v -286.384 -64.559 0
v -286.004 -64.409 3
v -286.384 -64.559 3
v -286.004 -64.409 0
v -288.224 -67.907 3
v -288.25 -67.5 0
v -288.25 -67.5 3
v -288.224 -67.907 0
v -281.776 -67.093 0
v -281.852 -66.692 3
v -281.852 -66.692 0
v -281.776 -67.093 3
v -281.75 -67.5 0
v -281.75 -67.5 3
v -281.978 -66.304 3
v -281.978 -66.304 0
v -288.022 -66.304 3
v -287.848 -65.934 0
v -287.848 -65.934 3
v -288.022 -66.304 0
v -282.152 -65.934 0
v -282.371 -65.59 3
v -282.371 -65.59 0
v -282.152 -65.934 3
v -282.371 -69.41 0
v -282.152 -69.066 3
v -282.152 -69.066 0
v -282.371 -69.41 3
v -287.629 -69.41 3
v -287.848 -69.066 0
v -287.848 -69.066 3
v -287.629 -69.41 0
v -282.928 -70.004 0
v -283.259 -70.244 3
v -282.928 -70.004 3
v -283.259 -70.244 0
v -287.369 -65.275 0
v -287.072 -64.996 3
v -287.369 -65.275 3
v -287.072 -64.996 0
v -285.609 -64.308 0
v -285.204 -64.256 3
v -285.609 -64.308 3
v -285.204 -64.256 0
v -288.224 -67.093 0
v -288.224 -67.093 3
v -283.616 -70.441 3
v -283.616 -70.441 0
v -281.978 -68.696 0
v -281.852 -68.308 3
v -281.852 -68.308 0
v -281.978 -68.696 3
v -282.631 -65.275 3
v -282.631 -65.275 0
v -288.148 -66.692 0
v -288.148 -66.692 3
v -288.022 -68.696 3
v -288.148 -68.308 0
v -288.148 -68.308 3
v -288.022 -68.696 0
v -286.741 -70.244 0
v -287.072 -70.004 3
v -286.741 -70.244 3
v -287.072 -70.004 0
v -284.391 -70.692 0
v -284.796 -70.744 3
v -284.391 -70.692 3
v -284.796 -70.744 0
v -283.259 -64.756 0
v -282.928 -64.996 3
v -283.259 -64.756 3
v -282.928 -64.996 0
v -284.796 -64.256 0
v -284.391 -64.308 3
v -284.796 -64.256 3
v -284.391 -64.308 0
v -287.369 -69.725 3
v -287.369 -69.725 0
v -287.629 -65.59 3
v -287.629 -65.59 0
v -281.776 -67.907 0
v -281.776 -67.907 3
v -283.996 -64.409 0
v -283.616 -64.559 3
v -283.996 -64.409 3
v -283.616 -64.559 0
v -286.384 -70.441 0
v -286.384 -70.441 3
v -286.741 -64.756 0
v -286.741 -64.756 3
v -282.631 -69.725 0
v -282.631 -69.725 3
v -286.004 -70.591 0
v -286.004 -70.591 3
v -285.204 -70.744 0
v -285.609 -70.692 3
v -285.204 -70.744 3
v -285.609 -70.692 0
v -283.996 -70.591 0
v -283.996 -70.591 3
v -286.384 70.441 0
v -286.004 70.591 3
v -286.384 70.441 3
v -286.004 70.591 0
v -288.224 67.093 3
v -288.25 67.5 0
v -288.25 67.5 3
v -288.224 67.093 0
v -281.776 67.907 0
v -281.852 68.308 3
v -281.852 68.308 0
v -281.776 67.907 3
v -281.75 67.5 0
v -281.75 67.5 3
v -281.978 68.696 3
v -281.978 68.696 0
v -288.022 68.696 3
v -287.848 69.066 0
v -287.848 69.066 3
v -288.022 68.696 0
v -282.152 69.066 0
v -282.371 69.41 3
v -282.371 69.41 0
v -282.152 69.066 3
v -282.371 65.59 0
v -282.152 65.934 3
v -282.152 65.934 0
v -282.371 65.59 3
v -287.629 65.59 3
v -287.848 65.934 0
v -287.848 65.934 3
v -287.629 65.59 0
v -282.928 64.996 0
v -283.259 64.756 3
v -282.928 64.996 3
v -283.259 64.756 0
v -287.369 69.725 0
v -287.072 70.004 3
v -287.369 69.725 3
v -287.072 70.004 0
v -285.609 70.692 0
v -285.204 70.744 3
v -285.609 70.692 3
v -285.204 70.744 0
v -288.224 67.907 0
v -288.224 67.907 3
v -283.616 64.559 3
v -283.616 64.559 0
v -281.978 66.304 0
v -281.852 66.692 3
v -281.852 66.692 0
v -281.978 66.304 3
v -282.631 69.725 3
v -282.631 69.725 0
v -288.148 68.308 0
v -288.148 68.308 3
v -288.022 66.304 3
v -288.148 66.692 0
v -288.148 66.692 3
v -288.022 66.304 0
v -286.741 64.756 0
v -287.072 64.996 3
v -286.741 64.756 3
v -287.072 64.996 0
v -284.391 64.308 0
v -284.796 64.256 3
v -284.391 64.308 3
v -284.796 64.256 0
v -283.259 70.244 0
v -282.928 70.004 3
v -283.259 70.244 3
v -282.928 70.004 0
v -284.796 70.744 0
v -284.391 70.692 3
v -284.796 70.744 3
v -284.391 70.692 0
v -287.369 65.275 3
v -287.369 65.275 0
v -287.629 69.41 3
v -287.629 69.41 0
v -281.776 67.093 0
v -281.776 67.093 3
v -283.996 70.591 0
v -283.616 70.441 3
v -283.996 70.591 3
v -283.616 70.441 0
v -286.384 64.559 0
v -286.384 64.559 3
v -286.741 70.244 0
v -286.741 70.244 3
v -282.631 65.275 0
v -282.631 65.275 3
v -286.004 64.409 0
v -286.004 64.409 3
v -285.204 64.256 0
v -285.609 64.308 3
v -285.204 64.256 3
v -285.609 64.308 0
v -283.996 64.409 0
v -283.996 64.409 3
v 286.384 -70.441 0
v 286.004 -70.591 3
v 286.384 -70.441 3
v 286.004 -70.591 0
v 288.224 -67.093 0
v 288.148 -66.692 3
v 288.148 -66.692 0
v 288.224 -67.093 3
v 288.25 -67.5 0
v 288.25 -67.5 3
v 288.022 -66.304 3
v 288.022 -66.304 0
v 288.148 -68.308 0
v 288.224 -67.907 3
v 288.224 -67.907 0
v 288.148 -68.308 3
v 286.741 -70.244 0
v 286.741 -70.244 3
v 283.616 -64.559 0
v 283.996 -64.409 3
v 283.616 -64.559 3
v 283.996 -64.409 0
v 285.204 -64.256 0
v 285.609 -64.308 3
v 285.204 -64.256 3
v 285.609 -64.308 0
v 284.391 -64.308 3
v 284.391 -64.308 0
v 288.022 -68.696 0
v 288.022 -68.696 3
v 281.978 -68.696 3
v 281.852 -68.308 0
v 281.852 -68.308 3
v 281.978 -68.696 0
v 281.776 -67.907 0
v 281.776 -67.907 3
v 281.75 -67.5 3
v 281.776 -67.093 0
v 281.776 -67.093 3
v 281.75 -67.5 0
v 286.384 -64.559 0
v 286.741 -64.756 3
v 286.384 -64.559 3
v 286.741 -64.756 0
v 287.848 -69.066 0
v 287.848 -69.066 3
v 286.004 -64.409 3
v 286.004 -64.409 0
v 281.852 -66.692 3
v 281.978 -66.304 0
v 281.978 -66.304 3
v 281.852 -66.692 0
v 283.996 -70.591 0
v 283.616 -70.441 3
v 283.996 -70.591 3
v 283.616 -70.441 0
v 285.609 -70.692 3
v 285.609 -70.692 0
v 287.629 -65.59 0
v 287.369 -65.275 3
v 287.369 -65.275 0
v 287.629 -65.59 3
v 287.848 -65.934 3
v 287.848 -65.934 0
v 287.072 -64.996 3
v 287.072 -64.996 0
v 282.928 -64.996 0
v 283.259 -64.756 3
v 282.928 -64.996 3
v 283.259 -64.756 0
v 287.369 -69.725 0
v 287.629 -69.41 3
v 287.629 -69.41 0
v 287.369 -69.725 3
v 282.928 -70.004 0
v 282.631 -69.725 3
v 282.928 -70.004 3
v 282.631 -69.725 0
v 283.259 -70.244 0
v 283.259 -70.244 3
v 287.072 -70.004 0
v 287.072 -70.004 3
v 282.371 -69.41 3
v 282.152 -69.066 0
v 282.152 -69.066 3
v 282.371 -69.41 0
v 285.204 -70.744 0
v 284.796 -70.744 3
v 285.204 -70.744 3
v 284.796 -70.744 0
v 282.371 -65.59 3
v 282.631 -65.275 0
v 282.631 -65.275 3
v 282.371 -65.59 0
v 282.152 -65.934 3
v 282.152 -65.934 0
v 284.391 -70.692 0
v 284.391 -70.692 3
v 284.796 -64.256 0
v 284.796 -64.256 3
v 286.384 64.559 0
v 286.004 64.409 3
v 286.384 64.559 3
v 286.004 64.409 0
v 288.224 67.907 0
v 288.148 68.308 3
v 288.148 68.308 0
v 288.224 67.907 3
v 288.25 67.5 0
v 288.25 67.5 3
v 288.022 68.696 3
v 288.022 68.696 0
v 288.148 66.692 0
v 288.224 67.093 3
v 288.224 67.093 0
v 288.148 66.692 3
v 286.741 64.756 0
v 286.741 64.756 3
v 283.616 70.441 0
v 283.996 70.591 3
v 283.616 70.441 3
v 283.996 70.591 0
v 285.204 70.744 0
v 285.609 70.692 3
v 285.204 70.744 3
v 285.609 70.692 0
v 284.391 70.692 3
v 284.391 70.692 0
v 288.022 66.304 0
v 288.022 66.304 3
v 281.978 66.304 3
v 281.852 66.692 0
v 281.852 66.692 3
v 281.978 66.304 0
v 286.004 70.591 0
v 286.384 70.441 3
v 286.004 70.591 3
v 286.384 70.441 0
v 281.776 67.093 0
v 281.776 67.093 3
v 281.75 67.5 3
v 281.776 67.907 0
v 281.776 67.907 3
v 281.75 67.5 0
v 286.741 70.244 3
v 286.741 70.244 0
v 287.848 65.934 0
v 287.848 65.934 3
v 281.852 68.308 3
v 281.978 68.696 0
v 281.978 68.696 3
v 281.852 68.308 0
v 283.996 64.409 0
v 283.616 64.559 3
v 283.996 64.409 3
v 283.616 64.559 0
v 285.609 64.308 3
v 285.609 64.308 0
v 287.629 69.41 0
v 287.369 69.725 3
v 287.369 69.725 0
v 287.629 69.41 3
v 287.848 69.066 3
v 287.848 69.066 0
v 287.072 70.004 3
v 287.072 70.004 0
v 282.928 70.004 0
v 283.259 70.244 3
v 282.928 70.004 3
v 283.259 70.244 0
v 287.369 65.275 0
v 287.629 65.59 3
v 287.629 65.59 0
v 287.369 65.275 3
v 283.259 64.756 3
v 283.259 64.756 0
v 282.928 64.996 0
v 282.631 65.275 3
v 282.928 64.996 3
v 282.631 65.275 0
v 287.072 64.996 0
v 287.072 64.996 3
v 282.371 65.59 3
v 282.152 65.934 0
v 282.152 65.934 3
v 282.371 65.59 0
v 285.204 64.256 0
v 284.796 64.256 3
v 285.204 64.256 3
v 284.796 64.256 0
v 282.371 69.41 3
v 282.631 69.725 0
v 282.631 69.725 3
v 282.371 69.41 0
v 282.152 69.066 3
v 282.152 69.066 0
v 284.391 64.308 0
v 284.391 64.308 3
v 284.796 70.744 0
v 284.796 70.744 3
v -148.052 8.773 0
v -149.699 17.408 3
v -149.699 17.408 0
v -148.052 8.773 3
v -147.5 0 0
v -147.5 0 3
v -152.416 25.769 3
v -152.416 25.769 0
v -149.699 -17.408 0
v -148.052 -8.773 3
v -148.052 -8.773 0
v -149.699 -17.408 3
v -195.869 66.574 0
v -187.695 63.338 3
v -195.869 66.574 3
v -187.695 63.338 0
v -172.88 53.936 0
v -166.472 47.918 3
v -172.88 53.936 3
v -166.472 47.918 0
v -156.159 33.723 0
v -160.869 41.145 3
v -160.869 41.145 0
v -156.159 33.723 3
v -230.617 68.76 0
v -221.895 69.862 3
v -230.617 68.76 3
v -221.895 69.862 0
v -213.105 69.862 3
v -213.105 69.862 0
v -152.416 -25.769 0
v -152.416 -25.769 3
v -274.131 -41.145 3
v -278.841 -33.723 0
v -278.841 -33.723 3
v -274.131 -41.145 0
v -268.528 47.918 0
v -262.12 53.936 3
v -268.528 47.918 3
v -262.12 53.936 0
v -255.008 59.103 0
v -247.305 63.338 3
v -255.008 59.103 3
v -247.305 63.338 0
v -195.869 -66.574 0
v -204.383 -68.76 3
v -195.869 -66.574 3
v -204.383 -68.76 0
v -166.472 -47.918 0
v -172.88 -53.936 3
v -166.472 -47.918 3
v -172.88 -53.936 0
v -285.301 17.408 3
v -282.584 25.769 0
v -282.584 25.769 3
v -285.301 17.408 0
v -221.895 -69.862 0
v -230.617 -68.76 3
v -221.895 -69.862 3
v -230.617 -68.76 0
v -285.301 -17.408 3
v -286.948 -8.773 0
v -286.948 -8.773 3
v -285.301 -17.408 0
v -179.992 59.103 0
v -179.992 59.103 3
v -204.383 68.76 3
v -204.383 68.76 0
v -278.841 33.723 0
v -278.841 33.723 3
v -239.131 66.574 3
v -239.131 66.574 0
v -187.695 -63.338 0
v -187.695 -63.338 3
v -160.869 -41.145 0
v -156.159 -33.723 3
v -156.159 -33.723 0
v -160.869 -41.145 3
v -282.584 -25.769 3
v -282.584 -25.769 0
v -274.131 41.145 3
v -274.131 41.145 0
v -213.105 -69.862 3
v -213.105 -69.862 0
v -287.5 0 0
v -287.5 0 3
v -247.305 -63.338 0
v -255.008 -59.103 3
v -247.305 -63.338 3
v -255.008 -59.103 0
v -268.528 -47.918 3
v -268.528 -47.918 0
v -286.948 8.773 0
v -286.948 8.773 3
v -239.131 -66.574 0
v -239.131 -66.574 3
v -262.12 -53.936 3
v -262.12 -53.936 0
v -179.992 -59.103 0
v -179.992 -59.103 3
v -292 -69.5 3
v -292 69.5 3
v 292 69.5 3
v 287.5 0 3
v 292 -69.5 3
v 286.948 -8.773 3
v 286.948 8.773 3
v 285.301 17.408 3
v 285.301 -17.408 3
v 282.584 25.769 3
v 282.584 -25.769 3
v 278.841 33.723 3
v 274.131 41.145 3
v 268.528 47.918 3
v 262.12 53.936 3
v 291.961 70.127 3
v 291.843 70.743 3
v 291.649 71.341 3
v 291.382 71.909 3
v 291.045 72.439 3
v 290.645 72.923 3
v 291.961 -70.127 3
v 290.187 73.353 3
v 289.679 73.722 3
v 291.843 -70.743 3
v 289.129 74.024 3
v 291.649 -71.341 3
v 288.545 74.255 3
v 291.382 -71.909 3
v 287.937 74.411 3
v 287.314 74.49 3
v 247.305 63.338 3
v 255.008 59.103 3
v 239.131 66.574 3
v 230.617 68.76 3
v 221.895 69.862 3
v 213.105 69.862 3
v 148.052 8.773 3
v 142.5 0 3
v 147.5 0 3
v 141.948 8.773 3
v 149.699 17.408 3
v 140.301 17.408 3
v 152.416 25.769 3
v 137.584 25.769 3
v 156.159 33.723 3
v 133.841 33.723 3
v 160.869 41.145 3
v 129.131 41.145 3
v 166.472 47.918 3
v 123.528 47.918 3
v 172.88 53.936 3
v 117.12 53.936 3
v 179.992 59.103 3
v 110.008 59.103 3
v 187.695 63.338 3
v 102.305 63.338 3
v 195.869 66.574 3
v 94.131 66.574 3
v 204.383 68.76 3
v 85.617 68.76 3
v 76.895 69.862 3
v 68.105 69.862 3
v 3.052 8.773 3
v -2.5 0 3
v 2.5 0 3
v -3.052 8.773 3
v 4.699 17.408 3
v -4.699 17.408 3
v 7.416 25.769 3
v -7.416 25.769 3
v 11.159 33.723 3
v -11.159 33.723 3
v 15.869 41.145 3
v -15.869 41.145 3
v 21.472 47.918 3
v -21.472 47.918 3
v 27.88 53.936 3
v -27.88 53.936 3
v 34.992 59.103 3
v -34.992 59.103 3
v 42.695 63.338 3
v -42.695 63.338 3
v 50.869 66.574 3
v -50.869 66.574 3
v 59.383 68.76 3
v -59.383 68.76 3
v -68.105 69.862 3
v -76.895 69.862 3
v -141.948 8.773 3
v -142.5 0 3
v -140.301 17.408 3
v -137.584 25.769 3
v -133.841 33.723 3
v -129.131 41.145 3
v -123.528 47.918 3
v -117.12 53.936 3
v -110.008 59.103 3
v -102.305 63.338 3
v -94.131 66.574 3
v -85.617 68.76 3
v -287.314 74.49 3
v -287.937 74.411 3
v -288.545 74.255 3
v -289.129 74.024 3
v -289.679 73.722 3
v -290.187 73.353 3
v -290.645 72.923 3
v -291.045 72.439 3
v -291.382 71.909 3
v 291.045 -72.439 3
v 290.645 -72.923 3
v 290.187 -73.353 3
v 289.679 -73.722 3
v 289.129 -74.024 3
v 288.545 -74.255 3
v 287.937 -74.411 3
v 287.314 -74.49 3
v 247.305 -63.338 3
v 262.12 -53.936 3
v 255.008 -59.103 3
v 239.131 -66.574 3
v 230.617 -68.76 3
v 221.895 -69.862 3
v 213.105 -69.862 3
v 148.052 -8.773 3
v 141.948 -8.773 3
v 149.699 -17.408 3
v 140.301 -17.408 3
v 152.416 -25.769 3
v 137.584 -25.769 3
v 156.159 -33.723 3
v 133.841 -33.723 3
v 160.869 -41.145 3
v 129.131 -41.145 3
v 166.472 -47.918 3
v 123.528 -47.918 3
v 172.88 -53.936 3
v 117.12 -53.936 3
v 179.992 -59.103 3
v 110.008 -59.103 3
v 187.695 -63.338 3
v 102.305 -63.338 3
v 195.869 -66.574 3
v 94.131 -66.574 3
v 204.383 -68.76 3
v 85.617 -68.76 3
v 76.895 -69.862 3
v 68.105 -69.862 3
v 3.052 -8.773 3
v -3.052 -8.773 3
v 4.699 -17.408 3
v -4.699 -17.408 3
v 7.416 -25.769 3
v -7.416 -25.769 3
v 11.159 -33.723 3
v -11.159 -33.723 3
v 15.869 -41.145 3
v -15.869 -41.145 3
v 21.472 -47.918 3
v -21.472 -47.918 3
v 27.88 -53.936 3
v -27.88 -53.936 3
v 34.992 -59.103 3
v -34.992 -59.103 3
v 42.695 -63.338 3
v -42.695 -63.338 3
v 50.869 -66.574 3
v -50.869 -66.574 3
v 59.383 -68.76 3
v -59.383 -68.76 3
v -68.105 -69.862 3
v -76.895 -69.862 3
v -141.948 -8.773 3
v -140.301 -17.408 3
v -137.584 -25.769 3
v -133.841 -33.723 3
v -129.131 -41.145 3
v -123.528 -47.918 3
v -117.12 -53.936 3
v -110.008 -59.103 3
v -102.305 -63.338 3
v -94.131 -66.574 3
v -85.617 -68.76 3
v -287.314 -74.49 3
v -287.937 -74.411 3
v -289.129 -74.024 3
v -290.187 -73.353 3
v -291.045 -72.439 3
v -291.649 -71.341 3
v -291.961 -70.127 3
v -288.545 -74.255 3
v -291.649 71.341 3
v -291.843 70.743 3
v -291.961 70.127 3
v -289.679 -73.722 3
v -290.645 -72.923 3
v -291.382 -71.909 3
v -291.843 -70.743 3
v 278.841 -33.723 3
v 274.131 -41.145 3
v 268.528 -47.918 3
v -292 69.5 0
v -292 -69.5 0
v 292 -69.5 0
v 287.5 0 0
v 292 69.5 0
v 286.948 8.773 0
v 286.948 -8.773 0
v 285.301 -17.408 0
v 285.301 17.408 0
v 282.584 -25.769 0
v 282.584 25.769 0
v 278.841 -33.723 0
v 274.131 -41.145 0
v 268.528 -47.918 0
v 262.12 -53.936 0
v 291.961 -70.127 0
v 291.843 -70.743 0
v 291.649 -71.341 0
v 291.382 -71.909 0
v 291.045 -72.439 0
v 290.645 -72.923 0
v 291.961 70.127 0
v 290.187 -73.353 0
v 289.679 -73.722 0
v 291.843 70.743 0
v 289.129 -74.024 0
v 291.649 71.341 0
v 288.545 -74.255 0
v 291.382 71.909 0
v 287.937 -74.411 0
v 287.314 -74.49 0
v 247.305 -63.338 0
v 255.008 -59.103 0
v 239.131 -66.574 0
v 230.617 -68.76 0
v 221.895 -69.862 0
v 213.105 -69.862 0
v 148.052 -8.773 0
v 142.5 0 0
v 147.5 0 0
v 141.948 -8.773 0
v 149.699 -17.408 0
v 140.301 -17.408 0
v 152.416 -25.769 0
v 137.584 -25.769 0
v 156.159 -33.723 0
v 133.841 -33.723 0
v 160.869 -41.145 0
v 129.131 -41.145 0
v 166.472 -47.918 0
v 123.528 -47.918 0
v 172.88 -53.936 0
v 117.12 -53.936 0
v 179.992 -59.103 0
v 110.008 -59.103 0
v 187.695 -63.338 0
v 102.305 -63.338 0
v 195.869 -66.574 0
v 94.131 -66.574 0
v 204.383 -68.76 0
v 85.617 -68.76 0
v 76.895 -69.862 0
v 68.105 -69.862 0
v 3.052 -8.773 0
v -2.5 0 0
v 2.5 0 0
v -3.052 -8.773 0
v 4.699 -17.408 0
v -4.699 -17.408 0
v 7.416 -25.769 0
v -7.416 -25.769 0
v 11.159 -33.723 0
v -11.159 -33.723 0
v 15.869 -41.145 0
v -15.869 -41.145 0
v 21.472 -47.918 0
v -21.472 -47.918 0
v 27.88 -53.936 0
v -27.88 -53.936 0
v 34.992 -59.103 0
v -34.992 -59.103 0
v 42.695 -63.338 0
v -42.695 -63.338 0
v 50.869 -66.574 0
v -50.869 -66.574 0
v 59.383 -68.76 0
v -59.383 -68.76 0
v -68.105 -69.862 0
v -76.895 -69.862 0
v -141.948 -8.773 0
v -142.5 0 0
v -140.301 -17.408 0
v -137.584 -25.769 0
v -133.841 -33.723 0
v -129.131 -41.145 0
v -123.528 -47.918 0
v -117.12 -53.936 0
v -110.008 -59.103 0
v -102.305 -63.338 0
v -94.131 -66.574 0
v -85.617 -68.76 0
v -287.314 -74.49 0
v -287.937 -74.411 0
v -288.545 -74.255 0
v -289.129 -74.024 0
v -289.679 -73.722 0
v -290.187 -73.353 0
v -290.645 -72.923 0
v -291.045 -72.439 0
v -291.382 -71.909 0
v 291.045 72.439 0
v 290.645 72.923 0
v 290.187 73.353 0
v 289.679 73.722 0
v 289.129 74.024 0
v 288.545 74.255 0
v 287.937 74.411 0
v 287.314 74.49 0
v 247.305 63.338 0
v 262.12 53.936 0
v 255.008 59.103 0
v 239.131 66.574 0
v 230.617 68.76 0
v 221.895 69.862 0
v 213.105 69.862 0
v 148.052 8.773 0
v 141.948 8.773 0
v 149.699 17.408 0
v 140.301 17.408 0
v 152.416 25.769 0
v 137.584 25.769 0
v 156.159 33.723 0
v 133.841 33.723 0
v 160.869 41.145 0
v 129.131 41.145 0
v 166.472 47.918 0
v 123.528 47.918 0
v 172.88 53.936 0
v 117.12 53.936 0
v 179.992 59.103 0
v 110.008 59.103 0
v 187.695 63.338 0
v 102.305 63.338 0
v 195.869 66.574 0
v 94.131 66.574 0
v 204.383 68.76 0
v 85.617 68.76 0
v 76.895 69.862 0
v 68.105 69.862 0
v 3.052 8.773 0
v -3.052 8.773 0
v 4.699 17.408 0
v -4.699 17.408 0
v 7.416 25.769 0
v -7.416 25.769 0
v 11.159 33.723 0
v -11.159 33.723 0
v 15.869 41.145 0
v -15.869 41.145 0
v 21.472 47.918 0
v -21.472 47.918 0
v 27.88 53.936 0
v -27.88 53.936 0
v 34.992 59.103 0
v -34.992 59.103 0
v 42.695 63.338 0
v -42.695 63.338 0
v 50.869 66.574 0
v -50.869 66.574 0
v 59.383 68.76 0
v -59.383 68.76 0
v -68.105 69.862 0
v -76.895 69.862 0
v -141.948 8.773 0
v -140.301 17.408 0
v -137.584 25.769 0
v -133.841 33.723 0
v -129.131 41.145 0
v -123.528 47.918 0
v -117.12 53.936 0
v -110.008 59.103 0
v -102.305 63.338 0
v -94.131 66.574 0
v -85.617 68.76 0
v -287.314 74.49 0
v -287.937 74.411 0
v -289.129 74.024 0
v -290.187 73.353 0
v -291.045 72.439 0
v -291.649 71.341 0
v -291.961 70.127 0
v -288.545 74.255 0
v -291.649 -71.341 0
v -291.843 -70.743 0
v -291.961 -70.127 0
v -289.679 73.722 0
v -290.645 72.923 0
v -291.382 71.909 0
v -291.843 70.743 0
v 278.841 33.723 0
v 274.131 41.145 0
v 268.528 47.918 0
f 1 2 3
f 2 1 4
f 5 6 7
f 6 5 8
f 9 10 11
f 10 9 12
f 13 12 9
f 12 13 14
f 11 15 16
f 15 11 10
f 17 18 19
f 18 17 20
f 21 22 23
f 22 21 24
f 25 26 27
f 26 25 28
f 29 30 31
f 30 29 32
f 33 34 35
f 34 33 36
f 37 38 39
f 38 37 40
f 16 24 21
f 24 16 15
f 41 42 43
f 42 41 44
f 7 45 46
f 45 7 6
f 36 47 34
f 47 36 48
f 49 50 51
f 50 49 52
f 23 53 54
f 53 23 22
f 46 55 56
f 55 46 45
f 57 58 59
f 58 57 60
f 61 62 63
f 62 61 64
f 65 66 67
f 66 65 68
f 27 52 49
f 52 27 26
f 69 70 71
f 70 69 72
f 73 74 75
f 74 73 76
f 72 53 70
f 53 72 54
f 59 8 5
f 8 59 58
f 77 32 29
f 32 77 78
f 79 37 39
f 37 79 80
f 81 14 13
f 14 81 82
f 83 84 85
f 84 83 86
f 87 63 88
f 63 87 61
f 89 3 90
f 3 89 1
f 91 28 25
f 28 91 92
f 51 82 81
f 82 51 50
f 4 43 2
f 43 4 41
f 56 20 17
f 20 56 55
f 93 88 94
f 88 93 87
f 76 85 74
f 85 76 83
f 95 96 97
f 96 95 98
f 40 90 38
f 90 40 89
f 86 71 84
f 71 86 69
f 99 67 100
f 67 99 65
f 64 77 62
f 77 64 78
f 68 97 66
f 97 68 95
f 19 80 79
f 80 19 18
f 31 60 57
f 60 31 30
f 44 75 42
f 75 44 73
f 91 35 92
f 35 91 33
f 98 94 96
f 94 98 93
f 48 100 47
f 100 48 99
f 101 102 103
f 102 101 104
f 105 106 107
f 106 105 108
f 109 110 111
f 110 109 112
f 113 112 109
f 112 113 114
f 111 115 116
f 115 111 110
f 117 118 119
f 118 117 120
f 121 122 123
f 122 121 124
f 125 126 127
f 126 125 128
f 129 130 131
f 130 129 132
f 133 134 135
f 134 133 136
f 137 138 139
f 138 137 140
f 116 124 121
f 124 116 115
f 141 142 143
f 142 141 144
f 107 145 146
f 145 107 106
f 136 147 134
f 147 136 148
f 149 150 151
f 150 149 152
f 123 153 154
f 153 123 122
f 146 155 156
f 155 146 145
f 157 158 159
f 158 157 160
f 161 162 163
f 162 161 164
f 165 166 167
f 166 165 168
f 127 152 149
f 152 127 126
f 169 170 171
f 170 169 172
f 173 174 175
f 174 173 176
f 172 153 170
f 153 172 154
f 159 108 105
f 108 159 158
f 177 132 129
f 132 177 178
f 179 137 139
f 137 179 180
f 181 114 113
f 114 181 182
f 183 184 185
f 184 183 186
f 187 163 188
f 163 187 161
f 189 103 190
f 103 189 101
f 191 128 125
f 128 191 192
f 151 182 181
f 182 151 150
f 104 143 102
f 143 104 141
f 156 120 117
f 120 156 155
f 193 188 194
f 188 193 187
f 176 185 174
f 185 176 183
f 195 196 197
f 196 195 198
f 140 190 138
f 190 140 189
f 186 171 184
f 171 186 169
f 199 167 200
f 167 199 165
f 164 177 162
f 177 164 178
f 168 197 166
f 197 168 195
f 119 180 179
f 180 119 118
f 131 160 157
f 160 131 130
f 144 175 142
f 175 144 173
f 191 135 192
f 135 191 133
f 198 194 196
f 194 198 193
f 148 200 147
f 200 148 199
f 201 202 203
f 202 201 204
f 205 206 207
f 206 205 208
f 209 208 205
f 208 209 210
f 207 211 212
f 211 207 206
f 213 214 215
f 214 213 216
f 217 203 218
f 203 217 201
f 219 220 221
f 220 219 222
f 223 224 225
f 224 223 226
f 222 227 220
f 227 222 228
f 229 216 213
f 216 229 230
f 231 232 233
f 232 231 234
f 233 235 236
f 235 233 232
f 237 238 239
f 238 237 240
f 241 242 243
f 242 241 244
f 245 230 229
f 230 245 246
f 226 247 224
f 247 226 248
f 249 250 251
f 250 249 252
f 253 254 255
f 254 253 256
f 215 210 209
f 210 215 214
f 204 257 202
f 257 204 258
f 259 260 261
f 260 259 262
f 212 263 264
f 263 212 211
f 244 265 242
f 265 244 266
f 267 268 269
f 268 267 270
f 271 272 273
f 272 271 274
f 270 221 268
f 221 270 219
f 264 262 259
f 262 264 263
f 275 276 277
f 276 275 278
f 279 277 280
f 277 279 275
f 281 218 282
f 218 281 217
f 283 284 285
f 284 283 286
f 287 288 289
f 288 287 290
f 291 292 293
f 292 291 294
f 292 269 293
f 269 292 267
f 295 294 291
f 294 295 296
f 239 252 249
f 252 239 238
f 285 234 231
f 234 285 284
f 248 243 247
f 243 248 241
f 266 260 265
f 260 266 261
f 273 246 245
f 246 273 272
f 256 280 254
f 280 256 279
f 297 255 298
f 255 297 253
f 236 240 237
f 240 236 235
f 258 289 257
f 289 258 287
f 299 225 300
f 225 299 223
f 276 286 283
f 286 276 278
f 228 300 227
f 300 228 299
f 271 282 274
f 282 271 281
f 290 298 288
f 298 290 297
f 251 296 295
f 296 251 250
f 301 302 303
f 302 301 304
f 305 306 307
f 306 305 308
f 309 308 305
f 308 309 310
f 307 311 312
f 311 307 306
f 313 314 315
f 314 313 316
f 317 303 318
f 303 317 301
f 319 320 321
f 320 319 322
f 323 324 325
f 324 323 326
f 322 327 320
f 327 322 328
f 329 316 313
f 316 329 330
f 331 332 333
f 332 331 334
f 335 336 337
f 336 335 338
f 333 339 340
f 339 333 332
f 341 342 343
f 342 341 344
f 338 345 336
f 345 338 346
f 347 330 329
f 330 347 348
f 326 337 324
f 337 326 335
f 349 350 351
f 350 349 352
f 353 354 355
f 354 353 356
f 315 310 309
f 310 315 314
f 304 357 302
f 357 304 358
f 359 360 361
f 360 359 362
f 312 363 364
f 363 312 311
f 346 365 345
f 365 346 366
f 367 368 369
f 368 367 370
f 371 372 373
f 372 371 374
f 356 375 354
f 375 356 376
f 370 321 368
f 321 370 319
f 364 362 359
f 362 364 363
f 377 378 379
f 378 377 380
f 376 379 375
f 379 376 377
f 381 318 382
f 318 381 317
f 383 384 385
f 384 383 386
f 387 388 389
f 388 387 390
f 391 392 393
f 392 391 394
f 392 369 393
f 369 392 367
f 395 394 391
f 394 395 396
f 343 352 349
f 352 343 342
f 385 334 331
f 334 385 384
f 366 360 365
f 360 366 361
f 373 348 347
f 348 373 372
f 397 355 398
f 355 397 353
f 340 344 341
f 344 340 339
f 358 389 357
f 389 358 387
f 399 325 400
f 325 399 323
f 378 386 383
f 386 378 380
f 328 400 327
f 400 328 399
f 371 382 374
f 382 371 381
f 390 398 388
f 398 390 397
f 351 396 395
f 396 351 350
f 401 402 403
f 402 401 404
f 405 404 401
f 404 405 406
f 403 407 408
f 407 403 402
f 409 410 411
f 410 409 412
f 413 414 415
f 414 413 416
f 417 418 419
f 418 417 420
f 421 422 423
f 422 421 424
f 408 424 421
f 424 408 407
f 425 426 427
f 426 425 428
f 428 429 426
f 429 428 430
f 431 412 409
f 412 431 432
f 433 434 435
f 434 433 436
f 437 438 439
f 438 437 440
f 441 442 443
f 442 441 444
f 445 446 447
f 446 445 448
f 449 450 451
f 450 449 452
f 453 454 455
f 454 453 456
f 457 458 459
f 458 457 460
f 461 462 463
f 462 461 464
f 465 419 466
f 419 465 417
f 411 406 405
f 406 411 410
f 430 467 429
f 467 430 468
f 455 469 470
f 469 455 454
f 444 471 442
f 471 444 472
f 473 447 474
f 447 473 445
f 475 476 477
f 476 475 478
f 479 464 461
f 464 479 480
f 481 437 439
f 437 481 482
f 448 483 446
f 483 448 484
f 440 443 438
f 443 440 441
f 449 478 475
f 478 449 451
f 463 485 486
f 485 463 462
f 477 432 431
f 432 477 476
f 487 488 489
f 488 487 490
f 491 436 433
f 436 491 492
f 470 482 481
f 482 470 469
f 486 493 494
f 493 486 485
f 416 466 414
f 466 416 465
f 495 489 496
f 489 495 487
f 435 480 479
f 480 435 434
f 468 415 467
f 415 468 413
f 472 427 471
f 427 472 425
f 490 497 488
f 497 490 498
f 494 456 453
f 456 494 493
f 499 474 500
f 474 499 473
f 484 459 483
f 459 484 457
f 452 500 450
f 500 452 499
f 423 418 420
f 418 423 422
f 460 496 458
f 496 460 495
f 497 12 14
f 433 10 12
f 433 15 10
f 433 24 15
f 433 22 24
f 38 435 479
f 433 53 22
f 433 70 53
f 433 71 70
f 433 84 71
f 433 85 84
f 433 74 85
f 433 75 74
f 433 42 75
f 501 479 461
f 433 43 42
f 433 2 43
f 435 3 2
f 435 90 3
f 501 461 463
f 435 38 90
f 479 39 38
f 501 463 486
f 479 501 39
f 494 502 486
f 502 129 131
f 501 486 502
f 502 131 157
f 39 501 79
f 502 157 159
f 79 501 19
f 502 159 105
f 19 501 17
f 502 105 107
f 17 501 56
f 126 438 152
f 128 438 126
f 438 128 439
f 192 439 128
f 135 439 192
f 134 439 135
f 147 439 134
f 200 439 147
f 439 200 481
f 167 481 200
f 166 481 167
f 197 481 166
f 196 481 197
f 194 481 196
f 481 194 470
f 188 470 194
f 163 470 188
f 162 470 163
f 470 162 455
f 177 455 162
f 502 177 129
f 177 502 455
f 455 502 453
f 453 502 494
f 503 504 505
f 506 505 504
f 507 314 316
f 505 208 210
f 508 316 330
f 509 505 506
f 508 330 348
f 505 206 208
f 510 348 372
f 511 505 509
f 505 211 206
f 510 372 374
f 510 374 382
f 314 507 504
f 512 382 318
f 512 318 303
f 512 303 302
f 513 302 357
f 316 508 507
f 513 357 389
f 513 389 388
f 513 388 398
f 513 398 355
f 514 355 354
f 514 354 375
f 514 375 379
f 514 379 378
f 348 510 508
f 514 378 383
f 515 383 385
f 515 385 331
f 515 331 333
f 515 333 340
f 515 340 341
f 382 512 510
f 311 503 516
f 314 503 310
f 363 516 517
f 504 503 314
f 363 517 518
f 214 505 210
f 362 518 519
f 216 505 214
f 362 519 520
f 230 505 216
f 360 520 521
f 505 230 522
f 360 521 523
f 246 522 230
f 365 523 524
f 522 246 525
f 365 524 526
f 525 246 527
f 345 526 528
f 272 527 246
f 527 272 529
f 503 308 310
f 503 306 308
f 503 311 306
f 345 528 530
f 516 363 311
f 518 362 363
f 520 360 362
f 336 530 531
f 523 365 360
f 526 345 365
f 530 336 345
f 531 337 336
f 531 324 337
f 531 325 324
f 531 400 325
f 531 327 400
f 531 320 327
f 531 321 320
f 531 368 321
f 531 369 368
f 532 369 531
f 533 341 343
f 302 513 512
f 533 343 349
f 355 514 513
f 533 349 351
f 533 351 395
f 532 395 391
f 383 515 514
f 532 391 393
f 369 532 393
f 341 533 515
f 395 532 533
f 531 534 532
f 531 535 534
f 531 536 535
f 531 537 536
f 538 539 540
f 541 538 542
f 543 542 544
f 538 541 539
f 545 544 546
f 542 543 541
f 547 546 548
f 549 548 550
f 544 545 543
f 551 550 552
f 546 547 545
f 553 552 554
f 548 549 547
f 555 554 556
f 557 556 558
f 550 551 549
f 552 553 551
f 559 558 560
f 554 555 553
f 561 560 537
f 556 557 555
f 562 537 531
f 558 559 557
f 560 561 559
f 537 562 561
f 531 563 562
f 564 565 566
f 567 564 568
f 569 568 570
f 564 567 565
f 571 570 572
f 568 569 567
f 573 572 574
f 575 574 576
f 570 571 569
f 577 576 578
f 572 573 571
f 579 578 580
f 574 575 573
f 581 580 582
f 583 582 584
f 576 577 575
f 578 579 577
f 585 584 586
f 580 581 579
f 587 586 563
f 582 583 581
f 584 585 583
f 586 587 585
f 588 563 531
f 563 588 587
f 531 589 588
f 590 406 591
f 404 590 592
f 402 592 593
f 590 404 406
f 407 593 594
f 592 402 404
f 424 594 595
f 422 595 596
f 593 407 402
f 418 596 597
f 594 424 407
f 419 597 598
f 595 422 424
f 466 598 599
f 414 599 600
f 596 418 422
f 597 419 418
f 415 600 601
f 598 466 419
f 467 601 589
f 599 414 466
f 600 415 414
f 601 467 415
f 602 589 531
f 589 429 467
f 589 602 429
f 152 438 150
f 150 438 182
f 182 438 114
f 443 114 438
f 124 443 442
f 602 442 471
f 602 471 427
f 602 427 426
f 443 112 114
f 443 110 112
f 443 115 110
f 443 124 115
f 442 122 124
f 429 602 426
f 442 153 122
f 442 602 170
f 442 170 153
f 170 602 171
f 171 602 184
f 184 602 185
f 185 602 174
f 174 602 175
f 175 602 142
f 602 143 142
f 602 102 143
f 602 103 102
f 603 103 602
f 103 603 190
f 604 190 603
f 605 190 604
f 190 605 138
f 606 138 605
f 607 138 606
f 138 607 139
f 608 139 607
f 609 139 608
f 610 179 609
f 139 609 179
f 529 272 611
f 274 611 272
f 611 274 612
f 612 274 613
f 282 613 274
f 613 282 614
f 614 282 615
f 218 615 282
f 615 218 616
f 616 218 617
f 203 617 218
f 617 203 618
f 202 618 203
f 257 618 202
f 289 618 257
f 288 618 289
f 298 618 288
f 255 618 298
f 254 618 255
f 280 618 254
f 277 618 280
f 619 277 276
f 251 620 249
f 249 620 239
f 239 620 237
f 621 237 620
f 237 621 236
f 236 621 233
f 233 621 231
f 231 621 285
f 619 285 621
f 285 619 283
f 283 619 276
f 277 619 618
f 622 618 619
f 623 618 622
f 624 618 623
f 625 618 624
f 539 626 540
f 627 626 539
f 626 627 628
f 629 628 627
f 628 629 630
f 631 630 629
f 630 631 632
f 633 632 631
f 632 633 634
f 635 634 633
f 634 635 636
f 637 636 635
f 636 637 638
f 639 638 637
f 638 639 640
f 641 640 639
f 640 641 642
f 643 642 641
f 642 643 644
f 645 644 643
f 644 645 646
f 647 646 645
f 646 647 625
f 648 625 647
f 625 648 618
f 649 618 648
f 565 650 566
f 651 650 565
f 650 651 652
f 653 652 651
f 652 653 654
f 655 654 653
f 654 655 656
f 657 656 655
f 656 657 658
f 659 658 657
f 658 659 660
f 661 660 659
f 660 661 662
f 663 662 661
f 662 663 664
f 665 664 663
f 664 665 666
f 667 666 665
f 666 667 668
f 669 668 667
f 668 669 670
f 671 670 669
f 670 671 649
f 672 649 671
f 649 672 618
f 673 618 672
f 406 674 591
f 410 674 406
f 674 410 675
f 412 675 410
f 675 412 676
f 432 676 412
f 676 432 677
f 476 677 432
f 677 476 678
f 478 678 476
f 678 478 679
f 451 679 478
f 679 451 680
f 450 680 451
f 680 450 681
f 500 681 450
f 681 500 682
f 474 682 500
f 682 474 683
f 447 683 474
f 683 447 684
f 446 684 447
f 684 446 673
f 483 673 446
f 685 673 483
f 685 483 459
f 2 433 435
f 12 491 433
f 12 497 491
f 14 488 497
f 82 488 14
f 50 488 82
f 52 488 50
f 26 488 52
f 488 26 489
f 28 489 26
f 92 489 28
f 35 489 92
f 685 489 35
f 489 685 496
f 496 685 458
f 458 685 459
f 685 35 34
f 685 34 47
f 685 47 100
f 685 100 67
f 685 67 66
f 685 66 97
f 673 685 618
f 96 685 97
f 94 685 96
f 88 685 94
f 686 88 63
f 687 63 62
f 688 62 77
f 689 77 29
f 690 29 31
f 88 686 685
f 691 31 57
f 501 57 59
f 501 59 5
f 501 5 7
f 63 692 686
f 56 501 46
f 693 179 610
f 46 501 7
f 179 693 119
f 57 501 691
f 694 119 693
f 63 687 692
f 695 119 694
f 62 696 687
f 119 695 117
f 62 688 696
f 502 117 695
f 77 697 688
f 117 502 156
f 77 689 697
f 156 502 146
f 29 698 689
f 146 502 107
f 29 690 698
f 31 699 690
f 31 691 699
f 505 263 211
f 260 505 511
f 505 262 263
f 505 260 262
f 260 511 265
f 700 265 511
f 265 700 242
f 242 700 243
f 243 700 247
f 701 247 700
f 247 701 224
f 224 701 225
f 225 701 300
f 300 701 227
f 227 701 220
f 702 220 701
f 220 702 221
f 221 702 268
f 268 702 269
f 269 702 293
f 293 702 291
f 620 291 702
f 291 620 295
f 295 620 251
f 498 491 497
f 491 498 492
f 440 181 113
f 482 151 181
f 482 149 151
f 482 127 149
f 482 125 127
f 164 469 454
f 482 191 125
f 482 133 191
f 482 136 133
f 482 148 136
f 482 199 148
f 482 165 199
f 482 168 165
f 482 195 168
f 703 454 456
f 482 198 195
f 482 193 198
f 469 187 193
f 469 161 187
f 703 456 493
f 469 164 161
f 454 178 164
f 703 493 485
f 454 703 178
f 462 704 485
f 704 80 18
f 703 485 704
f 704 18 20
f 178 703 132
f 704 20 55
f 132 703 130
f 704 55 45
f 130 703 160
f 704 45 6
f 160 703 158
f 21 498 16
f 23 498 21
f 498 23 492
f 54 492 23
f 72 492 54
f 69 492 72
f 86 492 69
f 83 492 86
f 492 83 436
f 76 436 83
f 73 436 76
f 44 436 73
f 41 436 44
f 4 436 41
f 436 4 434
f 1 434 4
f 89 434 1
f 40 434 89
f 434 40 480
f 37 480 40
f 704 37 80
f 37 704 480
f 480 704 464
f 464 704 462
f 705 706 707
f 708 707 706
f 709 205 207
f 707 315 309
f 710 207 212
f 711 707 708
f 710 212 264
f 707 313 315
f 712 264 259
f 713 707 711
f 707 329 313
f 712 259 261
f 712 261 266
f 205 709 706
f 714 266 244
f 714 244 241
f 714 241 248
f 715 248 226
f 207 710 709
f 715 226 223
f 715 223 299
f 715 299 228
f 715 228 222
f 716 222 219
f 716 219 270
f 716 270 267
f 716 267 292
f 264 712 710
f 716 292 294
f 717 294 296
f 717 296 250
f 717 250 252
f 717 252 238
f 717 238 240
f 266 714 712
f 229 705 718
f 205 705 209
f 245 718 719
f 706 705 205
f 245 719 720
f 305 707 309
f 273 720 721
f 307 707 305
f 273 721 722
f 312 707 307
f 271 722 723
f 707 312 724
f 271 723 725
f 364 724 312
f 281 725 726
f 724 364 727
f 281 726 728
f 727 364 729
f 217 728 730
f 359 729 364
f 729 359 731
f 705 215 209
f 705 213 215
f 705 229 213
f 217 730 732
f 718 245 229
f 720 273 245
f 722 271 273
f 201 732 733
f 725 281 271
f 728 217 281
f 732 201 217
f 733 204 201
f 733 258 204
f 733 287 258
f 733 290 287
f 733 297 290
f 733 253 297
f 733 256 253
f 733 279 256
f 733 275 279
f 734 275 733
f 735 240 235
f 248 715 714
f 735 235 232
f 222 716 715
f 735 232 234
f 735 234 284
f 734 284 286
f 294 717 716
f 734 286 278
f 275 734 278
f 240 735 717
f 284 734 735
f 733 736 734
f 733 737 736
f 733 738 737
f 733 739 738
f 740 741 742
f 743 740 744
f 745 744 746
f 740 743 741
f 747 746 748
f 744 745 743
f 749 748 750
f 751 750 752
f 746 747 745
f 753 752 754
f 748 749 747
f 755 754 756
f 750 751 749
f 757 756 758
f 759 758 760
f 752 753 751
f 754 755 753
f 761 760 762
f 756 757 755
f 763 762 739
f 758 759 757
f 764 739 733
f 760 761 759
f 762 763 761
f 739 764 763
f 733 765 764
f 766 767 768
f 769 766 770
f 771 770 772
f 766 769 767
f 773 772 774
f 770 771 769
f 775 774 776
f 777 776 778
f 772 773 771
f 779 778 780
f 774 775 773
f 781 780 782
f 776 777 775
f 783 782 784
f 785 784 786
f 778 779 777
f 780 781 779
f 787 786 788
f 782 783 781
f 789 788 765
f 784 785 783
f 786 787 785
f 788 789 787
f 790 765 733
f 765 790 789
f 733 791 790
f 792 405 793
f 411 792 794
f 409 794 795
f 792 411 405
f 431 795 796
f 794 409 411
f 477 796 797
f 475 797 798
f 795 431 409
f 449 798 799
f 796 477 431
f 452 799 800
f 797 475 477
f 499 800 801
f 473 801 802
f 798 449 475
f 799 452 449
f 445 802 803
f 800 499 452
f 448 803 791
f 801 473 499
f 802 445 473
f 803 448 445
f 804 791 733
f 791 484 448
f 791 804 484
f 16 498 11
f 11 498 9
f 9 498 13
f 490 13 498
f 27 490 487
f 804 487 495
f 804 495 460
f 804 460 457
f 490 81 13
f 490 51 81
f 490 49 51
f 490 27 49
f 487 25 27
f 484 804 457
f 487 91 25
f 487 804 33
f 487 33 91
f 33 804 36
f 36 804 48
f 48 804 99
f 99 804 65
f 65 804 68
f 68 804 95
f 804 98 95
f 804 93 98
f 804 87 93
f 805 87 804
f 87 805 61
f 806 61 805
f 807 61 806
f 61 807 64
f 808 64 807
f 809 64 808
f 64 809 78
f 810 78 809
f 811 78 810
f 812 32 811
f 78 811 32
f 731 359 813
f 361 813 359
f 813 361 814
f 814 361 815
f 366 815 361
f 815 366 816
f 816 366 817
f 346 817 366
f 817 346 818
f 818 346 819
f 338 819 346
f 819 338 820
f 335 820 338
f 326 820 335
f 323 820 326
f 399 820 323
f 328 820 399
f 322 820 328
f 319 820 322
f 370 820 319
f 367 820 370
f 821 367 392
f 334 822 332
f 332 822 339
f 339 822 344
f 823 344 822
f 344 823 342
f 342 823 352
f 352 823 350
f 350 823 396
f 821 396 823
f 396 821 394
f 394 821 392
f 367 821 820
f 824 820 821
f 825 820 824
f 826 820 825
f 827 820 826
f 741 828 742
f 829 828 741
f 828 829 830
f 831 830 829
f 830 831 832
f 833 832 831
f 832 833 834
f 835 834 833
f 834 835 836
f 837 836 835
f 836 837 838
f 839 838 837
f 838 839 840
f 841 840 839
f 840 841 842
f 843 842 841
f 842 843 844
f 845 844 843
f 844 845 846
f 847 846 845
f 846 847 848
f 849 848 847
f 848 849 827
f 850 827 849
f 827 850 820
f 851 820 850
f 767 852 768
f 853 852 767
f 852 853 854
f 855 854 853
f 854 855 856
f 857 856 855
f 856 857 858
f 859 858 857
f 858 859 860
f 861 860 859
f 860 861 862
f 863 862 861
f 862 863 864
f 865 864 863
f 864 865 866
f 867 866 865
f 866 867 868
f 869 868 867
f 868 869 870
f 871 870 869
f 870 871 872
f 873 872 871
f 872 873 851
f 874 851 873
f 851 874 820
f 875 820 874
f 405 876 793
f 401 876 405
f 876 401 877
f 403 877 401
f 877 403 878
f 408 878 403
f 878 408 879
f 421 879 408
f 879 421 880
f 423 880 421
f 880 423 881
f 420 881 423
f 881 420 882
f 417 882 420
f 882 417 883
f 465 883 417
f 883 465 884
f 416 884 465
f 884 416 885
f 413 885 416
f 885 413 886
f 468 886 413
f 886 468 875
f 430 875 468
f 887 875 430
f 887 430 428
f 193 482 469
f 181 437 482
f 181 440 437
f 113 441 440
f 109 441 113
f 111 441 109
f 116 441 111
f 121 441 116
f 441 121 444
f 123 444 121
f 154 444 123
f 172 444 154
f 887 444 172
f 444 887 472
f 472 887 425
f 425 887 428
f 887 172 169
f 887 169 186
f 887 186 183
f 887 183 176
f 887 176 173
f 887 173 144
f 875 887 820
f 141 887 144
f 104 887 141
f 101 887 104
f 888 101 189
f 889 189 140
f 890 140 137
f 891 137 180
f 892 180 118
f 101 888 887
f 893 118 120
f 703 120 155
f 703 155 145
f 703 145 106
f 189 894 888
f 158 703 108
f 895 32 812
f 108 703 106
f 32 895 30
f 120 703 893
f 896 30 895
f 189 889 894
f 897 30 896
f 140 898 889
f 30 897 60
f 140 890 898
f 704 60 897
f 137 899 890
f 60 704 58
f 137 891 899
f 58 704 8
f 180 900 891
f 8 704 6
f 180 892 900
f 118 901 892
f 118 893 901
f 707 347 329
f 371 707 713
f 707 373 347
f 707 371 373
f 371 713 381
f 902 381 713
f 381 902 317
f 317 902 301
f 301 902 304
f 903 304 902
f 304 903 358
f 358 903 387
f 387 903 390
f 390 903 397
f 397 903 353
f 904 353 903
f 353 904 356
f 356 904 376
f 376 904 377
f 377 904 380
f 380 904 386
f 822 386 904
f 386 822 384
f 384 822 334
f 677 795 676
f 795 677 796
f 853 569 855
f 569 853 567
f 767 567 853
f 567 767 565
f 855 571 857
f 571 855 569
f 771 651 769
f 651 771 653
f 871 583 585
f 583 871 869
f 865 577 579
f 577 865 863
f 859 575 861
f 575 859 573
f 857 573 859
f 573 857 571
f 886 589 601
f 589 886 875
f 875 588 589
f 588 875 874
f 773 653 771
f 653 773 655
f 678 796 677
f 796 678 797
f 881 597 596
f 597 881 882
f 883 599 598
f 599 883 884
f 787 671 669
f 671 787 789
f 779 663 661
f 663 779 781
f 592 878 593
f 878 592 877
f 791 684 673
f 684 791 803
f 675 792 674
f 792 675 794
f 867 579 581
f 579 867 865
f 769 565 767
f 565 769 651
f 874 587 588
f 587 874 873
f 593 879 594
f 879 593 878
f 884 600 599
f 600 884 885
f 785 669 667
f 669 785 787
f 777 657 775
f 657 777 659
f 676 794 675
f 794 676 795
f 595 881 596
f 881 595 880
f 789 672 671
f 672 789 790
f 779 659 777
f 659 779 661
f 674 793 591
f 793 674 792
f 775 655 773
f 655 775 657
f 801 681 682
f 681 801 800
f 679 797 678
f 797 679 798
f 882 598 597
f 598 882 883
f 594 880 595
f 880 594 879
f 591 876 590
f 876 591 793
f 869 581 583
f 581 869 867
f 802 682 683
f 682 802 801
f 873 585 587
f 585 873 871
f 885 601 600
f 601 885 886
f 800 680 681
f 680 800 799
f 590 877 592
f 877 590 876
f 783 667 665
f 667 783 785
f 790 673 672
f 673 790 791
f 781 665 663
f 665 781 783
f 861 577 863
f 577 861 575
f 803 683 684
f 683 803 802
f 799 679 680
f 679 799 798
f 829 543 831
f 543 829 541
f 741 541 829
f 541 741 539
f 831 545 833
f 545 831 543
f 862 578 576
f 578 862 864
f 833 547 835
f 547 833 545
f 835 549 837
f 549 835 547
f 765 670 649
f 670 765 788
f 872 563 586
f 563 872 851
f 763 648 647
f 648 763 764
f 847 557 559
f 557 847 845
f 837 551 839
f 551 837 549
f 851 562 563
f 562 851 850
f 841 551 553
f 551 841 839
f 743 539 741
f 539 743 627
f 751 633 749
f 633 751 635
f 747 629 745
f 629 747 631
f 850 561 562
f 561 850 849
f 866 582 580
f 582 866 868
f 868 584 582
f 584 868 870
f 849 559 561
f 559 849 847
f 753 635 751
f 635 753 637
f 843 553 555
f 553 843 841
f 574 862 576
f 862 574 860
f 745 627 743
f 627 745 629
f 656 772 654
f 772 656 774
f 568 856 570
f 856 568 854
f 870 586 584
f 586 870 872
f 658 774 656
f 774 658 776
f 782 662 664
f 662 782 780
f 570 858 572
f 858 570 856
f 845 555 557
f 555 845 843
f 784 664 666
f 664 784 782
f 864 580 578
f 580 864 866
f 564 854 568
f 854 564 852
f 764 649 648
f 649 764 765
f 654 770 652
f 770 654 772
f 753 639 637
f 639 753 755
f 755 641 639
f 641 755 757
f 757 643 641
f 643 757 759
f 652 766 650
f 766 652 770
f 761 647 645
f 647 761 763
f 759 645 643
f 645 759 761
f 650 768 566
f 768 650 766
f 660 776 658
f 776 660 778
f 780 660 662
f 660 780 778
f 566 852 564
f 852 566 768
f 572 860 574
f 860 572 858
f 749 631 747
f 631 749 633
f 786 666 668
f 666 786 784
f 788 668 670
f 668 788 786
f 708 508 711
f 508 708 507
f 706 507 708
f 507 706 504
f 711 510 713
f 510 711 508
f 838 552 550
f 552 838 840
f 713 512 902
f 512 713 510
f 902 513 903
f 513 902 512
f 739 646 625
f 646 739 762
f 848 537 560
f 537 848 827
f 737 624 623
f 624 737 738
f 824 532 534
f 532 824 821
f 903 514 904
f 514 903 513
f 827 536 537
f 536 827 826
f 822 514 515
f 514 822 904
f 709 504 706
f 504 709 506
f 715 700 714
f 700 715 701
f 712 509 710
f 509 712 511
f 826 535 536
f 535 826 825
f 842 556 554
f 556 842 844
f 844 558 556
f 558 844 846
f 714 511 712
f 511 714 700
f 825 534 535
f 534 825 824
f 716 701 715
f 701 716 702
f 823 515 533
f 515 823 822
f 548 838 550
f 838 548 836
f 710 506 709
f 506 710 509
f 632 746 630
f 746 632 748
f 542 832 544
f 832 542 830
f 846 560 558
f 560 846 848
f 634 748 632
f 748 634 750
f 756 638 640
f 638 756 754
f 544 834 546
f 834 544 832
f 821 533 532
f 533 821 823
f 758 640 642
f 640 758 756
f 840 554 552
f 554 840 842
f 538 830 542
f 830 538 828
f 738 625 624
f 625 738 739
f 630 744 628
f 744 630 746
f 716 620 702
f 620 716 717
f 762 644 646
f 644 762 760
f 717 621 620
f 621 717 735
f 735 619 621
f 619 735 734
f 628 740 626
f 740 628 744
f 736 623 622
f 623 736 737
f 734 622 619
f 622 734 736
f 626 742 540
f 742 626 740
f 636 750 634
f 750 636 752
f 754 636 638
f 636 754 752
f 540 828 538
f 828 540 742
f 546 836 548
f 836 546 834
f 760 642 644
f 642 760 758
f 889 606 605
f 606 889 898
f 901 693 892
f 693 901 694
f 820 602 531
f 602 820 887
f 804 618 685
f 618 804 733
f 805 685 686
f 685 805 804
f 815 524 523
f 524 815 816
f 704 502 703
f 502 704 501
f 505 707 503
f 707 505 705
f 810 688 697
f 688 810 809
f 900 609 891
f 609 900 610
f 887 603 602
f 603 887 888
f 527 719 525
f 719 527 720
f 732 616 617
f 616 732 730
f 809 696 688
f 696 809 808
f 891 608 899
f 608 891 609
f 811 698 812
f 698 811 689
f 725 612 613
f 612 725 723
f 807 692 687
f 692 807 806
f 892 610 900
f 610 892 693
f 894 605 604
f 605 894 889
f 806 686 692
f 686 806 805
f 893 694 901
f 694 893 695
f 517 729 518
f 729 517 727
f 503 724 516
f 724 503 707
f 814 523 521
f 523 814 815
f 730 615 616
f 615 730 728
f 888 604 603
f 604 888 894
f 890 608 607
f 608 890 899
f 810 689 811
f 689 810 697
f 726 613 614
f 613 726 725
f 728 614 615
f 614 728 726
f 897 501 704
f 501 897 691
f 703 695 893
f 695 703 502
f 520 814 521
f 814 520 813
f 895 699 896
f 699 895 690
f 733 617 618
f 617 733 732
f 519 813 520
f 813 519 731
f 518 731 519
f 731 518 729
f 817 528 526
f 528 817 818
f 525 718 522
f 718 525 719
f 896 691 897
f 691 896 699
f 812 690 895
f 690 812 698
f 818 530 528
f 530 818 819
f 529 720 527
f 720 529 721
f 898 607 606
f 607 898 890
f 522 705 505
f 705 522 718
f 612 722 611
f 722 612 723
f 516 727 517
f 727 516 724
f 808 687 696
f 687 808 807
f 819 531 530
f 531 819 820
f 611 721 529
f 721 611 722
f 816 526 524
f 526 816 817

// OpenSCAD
$fn = 50;

difference() {
	union() {
		hull() {
			translate(v = [-287.0, 69.5, 0]) {
				cylinder(h = 3, r = 5);
			}
			translate(v = [287.0, 69.5, 0]) {
				cylinder(h = 3, r = 5);
			}
			translate(v = [-287.0, -69.5, 0]) {
				cylinder(h = 3, r = 5);
			}
			translate(v = [287.0, -69.5, 0]) {
				cylinder(h = 3, r = 5);
			}
		}
	}
	union() {
		translate(v = [-285.0, -67.5, -100.0]) {
			cylinder(h = 200, r = 3.25);
		}
		translate(v = [-285.0, 67.5, -100.0]) {
			cylinder(h = 200, r = 3.25);
		}
		translate(v = [285.0, -67.5, -100.0]) {
			cylinder(h = 200, r = 3.25);
		}
		translate(v = [285.0, 67.5, -100.0]) {
			cylinder(h = 200, r = 3.25);
		}
		translate(v = [-285.0, -67.5, -100.0]) {
			cylinder(h = 200, r = 1.8);
		}
		translate(v = [-285.0, 67.5, -100.0]) {
			cylinder(h = 200, r = 1.8);
		}
		translate(v = [285.0, -67.5, -100.0]) {
			cylinder(h = 200, r = 1.8);
		}
		translate(v = [285.0, 67.5, -100.0]) {
			cylinder(h = 200, r = 1.8);
		}
		translate(v = [-217.5, 0, 0.0]) {
			cylinder(h = 3, r = 70.0);
		}
		translate(v = [-72.5, 0, 0.0]) {
			cylinder(h = 3, r = 70.0);
		}
		translate(v = [72.5, 0, 0.0]) {
			cylinder(h = 3, r = 70.0);
		}
		translate(v = [217.5, 0, 0.0]) {
			cylinder(h = 3, r = 70.0);
		}
	}
}
